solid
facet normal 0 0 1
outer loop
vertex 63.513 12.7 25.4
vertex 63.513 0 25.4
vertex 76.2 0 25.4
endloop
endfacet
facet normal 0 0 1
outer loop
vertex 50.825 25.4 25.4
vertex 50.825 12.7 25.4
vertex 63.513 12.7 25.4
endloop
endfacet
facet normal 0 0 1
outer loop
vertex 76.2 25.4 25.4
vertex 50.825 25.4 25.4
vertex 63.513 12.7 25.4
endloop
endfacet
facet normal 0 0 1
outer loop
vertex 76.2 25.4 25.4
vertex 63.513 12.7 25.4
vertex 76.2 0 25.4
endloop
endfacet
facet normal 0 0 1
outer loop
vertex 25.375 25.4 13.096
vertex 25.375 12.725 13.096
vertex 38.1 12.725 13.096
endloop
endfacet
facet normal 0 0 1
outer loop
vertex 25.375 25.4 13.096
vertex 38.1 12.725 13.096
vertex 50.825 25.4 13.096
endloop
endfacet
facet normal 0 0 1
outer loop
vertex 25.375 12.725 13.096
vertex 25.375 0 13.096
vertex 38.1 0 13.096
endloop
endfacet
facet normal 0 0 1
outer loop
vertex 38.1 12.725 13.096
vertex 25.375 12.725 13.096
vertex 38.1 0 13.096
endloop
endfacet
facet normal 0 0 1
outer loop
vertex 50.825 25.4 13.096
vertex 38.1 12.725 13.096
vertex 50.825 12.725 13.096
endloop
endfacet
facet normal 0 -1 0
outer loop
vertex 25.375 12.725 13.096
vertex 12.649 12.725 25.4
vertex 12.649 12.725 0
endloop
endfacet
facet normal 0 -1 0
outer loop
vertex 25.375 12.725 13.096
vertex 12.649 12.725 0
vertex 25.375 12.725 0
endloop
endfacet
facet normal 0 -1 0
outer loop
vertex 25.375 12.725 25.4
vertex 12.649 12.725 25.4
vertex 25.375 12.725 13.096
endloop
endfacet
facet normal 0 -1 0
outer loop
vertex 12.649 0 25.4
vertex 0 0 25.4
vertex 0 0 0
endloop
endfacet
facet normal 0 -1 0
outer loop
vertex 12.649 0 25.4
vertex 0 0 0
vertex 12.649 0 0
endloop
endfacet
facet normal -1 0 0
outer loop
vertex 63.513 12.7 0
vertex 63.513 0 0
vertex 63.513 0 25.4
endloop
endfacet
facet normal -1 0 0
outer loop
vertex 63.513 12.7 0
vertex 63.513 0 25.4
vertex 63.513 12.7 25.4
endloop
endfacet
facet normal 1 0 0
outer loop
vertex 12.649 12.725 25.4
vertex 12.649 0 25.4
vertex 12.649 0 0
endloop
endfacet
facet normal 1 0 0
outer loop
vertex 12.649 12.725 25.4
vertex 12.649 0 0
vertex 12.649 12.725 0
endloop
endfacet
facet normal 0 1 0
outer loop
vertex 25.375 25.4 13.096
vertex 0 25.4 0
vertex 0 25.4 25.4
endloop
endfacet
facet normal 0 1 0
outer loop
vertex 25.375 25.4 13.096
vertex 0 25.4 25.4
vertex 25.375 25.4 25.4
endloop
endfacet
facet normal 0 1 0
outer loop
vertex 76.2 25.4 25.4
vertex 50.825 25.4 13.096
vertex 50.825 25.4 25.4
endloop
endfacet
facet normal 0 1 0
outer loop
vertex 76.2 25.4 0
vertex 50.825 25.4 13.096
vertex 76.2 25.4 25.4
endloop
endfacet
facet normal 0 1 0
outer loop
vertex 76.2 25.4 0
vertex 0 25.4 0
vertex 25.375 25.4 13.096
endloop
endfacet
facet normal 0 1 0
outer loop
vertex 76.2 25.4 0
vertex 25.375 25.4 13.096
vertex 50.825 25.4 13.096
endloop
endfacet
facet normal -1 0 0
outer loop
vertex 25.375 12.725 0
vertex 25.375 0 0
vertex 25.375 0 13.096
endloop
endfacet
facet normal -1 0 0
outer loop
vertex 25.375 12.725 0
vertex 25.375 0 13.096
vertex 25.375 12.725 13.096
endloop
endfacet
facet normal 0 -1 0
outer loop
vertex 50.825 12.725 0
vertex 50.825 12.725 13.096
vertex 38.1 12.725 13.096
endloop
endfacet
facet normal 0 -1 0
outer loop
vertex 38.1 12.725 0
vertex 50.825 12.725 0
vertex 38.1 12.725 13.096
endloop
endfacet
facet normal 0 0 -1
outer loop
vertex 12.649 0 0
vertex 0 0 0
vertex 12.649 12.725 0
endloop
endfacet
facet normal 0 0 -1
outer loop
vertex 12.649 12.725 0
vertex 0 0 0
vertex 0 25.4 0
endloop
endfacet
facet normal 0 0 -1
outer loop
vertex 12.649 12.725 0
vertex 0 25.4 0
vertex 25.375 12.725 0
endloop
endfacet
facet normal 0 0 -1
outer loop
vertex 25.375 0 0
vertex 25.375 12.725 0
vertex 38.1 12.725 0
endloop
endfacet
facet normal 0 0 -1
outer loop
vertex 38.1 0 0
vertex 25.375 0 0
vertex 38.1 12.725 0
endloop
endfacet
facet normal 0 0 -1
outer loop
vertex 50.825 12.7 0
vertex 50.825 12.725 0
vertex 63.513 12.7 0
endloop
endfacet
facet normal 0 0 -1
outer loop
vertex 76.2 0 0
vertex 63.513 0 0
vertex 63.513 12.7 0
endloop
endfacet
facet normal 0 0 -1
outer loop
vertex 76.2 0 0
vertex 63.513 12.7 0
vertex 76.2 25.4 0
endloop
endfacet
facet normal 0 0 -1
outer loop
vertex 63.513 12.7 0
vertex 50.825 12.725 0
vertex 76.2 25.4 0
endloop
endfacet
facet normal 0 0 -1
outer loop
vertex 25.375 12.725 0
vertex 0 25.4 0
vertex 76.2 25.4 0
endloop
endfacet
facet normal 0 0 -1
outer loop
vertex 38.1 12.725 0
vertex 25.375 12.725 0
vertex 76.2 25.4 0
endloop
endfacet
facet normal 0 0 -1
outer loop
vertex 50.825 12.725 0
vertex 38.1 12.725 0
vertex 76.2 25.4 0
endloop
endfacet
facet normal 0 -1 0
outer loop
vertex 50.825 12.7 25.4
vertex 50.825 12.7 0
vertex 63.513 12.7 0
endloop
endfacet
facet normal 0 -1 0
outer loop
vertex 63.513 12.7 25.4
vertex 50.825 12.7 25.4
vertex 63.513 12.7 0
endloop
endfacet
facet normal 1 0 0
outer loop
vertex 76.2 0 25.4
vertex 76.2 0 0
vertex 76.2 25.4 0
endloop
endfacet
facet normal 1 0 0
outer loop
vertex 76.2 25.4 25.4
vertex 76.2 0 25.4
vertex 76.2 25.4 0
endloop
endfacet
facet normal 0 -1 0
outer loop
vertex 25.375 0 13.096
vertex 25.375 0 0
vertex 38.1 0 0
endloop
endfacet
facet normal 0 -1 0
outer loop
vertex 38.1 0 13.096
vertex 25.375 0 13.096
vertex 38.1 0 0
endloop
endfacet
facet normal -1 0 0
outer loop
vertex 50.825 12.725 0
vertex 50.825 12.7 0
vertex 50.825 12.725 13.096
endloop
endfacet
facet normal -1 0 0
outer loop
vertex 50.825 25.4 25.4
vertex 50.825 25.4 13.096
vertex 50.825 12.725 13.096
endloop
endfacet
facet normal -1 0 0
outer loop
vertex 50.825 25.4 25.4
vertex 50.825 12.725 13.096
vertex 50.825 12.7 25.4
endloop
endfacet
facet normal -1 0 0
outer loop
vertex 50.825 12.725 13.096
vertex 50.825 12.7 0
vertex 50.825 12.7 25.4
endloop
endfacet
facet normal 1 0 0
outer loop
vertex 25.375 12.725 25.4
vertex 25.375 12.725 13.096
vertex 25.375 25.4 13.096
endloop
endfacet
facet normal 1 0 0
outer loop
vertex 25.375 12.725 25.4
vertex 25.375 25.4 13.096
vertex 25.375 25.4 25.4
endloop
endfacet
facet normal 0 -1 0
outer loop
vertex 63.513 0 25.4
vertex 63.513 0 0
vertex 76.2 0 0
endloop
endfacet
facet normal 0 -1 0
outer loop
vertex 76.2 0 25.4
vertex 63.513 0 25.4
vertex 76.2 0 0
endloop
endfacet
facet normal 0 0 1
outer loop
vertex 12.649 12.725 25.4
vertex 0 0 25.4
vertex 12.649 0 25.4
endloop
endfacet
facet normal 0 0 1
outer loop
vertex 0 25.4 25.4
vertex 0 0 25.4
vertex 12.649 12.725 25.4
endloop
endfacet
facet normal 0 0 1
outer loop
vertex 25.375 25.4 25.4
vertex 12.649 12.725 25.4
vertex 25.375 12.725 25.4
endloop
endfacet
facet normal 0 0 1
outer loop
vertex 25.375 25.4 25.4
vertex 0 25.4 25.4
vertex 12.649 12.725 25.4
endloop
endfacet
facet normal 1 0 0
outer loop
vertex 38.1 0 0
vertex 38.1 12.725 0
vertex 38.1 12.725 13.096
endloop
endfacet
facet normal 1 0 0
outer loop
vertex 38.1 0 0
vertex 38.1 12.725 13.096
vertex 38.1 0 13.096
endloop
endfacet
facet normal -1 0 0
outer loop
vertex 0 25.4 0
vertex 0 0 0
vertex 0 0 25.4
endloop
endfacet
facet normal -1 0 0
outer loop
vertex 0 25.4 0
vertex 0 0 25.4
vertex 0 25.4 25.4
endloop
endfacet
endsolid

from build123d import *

# Parameters (mm, degrees)
F0_W     = 76.2
F0_H     = 25.4
F1_DEPTH = 25.4
F2_W     = 25.4508
F2_H     = 12.7254
F3_DEPTH = 25.4
F4_W     = 12.7254
F4_H     = 12.7254
F5_DEPTH = 25.654
F6_W     = 12.6873
F6_H     = 12.7
F7_DEPTH = 25.654
F9_DEPTH = 25.4


with BuildPart() as f1:
    # F0 (on Top) → F1 (new body)
    with BuildSketch(Plane.XY):
        with Locations((38.1, 12.7)):
            Rectangle(F0_W, F0_H)
    extrude(amount=F1_DEPTH)

    # F2 (on Front) → F3 (cut)
    with BuildSketch(Plane.XZ):
        with Locations((38.1, 19.4584317505)):
            Rectangle(F2_W, F2_H)
    extrude(amount=-F3_DEPTH, mode=Mode.SUBTRACT)

    # F4 (on face) → F5 (cut)
    with BuildSketch(Plane.XY.offset(25.4)):
        with Locations((19.0119, 6.3627)):
            Rectangle(F4_W, F4_H)
    extrude(amount=-F5_DEPTH, mode=Mode.SUBTRACT)

    # F6 (on face) → F7 (cut)
    with BuildSketch(Plane.XY.offset(25.4)):
        with Locations((57.16905, 6.35)):
            Rectangle(F6_W, F6_H)
    extrude(amount=-F7_DEPTH, mode=Mode.SUBTRACT)

    # F8 (on face) → F9 (cut)
    with BuildSketch(Plane.XY.offset(13.0957317505)):
        Polygon((38.1, 0), (50.8254, 0), (50.8254, 12.7), (50.8254, 12.7254), (38.1, 12.7254), align=None)
    extrude(amount=-F9_DEPTH, mode=Mode.SUBTRACT)


solid = f1.part
